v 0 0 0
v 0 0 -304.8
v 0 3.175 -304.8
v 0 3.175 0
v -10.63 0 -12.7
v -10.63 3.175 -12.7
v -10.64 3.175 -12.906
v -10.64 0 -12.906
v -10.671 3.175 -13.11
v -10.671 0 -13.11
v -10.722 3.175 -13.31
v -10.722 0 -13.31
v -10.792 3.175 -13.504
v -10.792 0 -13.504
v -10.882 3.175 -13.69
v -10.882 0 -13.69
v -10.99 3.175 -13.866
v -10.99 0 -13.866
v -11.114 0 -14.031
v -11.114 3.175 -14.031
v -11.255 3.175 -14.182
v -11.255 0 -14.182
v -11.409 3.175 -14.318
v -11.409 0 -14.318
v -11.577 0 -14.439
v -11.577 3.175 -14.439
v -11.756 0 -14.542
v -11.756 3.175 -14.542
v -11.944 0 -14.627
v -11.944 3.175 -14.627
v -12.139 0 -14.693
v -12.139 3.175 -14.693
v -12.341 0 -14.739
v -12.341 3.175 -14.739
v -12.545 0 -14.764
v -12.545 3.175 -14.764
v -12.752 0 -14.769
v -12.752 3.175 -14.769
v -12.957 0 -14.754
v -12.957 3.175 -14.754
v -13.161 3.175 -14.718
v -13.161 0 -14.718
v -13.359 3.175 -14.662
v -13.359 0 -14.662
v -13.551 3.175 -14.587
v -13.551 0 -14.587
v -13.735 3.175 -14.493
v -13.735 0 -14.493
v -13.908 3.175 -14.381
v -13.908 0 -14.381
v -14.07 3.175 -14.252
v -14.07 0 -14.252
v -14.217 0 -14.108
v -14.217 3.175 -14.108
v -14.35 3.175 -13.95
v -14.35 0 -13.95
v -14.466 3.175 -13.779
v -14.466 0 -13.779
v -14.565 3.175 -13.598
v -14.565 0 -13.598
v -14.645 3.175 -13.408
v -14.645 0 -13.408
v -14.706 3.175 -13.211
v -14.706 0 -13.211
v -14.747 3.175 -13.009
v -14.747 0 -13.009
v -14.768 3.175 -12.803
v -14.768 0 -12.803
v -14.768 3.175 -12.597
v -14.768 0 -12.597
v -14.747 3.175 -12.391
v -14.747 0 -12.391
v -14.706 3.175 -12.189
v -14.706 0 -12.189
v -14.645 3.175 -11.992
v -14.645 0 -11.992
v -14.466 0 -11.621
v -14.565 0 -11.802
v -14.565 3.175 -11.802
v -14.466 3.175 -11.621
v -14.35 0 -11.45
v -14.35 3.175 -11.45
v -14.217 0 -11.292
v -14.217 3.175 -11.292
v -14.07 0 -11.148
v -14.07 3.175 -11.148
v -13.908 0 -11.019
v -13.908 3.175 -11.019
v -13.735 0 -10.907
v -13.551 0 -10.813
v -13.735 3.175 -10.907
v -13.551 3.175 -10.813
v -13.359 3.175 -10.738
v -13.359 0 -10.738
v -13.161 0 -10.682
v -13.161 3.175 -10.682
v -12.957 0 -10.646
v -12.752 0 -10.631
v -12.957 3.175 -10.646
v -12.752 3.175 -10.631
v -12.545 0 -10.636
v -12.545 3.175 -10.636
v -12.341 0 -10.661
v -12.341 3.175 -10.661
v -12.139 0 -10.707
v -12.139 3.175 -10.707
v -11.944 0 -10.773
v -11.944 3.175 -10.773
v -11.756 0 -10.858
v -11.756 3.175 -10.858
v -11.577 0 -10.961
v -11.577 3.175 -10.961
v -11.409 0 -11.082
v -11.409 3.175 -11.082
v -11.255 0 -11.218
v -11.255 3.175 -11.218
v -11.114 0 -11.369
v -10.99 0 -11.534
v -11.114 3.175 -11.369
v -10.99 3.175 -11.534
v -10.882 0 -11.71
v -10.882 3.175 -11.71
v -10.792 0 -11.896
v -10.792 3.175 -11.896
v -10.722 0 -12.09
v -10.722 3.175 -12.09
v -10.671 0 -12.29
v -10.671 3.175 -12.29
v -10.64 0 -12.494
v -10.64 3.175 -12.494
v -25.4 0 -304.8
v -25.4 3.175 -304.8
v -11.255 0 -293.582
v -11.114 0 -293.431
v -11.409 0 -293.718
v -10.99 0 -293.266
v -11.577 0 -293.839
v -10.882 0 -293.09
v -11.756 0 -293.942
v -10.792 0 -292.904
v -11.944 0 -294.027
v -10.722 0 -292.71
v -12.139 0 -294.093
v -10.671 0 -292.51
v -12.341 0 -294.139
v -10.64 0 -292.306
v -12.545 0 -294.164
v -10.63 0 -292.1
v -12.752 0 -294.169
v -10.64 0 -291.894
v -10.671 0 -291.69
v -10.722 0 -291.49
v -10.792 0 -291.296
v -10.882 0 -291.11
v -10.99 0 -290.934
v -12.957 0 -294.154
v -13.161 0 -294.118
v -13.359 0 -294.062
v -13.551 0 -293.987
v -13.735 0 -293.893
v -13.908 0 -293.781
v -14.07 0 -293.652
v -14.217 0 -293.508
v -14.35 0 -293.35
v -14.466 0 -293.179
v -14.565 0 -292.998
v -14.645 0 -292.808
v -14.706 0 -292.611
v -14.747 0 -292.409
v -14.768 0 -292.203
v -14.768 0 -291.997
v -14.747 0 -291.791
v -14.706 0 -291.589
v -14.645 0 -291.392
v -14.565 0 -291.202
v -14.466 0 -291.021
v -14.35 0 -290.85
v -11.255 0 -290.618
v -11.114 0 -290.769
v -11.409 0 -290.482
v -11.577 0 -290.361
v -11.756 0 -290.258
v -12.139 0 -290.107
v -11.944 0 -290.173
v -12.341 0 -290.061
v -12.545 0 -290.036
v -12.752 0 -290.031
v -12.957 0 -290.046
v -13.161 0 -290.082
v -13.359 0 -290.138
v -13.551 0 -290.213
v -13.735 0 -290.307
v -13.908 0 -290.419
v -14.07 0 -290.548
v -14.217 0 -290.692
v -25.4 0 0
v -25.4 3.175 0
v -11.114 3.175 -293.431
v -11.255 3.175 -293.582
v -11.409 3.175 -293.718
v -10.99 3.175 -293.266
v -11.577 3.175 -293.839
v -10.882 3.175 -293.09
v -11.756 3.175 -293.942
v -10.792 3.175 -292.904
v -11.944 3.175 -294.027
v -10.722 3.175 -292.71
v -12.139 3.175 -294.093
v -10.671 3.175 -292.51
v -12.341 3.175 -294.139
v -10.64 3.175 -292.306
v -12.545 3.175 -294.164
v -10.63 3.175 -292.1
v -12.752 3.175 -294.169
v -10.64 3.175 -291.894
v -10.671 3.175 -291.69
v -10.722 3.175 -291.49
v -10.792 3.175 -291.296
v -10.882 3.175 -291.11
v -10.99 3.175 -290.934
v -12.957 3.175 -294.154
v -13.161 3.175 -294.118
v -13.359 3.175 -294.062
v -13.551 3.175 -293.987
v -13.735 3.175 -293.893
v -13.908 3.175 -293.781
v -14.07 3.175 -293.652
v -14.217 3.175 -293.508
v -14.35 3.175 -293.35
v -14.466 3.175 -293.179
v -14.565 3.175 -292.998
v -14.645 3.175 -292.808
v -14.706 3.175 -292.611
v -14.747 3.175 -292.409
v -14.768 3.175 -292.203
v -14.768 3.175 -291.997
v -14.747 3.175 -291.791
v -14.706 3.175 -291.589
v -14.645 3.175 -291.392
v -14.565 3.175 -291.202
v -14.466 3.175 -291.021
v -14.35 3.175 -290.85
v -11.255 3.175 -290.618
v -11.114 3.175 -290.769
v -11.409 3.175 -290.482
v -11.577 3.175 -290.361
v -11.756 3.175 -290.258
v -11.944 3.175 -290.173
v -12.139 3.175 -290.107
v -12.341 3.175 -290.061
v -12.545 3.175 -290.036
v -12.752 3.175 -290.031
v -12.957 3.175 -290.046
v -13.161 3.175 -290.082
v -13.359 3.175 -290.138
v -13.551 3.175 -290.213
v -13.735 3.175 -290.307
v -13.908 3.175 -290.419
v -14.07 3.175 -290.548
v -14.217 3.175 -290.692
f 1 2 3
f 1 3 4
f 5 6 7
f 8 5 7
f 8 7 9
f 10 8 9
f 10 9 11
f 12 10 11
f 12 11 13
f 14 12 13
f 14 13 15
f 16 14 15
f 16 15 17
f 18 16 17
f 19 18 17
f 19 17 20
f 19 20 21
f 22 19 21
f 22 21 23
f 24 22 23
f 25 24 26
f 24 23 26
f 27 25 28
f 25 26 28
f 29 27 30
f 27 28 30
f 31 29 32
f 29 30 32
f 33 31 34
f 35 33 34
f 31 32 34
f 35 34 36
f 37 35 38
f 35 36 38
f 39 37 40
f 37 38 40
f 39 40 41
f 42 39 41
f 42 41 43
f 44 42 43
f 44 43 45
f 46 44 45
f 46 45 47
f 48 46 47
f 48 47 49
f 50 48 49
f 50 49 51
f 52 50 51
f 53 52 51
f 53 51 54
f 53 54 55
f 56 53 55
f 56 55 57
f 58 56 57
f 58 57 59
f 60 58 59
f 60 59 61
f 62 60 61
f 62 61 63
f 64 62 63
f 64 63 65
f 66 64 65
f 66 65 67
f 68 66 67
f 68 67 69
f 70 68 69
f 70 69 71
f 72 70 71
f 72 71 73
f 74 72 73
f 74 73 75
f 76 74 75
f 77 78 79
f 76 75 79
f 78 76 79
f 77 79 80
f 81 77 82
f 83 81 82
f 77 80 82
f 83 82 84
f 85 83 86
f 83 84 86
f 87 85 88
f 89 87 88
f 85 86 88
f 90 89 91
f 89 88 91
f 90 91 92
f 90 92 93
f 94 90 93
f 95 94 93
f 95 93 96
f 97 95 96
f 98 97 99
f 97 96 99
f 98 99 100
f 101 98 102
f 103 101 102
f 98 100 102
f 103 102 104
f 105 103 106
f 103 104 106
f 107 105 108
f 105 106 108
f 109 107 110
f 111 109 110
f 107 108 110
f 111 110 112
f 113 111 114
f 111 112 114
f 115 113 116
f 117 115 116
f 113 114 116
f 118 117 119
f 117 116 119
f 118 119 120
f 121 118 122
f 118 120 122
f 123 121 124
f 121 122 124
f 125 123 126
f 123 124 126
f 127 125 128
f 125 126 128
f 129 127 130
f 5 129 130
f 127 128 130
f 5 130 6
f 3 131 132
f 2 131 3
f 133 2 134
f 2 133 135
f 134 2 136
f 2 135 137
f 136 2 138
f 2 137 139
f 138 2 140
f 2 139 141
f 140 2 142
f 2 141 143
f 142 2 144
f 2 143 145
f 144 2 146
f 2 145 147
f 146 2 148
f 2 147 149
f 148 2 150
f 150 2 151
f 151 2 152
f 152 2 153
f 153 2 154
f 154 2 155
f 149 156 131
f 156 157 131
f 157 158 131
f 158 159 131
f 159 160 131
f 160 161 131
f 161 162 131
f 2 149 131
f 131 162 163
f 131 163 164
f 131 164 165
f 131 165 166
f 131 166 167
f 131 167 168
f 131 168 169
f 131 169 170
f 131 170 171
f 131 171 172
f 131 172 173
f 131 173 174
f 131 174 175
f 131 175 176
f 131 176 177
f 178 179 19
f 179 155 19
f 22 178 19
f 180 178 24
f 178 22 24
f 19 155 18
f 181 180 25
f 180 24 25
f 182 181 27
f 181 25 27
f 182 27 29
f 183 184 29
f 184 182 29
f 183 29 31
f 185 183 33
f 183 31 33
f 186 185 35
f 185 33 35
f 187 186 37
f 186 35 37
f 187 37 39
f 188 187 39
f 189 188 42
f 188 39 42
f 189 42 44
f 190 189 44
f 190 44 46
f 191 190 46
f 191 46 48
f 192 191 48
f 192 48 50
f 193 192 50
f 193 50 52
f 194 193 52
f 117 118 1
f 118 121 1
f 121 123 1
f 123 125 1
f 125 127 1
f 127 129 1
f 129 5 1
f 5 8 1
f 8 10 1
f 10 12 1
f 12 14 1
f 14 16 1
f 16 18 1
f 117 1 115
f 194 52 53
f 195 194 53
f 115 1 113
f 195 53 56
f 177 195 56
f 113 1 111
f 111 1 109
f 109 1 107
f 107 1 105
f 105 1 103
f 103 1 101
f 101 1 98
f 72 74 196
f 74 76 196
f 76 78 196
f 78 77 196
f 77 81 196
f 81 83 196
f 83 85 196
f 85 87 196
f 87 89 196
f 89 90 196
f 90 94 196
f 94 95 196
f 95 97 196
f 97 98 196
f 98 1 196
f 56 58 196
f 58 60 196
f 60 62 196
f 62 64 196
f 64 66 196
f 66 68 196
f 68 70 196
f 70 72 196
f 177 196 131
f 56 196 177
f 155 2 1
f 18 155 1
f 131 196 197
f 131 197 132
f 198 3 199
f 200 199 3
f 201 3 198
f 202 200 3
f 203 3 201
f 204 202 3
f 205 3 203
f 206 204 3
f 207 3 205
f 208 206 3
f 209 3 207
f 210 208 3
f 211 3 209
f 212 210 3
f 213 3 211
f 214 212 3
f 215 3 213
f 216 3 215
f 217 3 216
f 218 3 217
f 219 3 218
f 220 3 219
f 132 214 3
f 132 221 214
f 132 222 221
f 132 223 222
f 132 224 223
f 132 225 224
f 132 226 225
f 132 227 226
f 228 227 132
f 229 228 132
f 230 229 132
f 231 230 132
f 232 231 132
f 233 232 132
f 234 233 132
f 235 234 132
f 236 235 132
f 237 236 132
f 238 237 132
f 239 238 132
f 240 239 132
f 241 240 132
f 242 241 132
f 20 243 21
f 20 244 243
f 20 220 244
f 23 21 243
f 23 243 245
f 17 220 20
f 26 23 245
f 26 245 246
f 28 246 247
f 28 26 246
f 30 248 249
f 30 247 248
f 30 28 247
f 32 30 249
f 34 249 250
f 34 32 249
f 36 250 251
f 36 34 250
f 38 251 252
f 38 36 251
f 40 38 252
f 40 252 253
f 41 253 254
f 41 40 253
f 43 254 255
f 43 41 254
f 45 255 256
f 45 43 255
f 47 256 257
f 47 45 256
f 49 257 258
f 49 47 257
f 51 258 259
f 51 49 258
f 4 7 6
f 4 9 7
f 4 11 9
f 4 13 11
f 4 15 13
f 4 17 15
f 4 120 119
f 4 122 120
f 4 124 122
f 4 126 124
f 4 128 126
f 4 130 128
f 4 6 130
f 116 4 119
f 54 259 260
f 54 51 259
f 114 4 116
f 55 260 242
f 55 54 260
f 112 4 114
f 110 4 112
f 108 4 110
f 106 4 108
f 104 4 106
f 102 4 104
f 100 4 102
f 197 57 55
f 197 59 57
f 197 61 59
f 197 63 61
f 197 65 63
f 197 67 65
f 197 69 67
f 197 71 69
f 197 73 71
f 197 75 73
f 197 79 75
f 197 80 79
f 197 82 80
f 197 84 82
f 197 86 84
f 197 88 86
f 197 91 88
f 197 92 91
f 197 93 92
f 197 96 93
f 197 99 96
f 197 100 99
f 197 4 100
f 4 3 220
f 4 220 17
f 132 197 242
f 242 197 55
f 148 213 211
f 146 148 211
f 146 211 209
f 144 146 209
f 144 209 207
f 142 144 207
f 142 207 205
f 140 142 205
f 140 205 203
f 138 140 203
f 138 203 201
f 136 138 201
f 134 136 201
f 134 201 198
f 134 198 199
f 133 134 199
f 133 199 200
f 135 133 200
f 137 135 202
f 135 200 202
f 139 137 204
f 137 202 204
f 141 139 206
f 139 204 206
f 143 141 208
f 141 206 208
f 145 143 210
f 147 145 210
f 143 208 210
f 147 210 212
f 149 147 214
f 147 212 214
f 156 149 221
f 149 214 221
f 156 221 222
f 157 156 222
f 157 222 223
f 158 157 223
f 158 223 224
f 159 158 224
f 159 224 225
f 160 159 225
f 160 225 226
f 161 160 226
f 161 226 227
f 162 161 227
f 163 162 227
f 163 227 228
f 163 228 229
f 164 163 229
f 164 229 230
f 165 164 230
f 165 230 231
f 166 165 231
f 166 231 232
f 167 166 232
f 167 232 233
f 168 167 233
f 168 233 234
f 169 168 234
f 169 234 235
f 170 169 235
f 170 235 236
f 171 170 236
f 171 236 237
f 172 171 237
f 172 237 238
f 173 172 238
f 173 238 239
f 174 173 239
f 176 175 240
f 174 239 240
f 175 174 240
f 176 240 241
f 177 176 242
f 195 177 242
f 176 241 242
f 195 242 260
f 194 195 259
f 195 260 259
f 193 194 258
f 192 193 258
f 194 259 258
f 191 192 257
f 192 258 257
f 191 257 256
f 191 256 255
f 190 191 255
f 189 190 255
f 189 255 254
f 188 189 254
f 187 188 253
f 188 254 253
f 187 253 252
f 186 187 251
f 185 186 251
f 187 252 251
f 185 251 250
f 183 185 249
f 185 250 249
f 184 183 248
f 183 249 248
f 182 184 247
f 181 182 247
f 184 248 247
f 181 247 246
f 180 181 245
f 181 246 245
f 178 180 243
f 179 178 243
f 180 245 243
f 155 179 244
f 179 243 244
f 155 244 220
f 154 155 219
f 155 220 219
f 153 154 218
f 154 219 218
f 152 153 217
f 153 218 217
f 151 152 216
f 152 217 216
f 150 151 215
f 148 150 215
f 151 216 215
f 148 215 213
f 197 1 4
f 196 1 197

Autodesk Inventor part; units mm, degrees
ref_plane "YZ Plane" through (0, 0, 0) normal (1, 0, 0) x (0, 1, 0)
ref_plane "XZ Plane" through (0, 0, 0) normal (0, 1, 0) x (-1, 0, 0)
ref_plane "XY Plane" through (0, 0, 0) normal (0, 0, 1) x (1, 0, 0)
sketch "Sketch1" plane through (0, 0, 0) normal (0, 1, 0) x (-1, 0, 0)
  line L0 (0, 0) -> (25.4, 0)
  line L1 (25.4, 0) -> (25.4, -304.8)
  line L2 (25.4, -304.8) -> (0, -304.8)
  line L3 (0, -304.8) -> (0, 0)
  dimension "d0" = 304.8
  dimension "d1" = 25.4
extrude "Extrusion1" add sketch "Sketch1" along normal blind 3.175
sketch "Sketch2" plane through (0, 3.175, 0) normal (0, 1, 0) x (1, 0, 0)
  circle A0 centre (-12.7, 12.7) radius 2.0701
  line L0 (-25.4, 304.8) -> (-25.4, 0) projected
  line L1 (-25.4, 0) -> (0, 0) projected
  dimension "d4" = 4.1402
  dimension "d5" = 12.7
  dimension "d6" = 12.7
extrude "Extrusion2" cut sketch "Sketch2" against normal blind 25.4
sketch "Sketch3" plane through (0, 3.175, 0) normal (0, 1, 0) x (1, 0, 0)
  circle A0 centre (-12.7, 292.1) radius 2.0701
  line L0 (-25.4, 304.8) -> (-25.4, 0) projected
  line L1 (0, 304.8) -> (-25.4, 304.8) projected
  point P0 (0, 0)
  dimension "d9" = 4.1402
  dimension "d10" = 12.7
  dimension "d11" = 12.7
extrude "Extrusion3" cut sketch "Sketch3" against normal blind 25.4
properties part number "12in Aluminum Plate-ver-1-1111-2019"
